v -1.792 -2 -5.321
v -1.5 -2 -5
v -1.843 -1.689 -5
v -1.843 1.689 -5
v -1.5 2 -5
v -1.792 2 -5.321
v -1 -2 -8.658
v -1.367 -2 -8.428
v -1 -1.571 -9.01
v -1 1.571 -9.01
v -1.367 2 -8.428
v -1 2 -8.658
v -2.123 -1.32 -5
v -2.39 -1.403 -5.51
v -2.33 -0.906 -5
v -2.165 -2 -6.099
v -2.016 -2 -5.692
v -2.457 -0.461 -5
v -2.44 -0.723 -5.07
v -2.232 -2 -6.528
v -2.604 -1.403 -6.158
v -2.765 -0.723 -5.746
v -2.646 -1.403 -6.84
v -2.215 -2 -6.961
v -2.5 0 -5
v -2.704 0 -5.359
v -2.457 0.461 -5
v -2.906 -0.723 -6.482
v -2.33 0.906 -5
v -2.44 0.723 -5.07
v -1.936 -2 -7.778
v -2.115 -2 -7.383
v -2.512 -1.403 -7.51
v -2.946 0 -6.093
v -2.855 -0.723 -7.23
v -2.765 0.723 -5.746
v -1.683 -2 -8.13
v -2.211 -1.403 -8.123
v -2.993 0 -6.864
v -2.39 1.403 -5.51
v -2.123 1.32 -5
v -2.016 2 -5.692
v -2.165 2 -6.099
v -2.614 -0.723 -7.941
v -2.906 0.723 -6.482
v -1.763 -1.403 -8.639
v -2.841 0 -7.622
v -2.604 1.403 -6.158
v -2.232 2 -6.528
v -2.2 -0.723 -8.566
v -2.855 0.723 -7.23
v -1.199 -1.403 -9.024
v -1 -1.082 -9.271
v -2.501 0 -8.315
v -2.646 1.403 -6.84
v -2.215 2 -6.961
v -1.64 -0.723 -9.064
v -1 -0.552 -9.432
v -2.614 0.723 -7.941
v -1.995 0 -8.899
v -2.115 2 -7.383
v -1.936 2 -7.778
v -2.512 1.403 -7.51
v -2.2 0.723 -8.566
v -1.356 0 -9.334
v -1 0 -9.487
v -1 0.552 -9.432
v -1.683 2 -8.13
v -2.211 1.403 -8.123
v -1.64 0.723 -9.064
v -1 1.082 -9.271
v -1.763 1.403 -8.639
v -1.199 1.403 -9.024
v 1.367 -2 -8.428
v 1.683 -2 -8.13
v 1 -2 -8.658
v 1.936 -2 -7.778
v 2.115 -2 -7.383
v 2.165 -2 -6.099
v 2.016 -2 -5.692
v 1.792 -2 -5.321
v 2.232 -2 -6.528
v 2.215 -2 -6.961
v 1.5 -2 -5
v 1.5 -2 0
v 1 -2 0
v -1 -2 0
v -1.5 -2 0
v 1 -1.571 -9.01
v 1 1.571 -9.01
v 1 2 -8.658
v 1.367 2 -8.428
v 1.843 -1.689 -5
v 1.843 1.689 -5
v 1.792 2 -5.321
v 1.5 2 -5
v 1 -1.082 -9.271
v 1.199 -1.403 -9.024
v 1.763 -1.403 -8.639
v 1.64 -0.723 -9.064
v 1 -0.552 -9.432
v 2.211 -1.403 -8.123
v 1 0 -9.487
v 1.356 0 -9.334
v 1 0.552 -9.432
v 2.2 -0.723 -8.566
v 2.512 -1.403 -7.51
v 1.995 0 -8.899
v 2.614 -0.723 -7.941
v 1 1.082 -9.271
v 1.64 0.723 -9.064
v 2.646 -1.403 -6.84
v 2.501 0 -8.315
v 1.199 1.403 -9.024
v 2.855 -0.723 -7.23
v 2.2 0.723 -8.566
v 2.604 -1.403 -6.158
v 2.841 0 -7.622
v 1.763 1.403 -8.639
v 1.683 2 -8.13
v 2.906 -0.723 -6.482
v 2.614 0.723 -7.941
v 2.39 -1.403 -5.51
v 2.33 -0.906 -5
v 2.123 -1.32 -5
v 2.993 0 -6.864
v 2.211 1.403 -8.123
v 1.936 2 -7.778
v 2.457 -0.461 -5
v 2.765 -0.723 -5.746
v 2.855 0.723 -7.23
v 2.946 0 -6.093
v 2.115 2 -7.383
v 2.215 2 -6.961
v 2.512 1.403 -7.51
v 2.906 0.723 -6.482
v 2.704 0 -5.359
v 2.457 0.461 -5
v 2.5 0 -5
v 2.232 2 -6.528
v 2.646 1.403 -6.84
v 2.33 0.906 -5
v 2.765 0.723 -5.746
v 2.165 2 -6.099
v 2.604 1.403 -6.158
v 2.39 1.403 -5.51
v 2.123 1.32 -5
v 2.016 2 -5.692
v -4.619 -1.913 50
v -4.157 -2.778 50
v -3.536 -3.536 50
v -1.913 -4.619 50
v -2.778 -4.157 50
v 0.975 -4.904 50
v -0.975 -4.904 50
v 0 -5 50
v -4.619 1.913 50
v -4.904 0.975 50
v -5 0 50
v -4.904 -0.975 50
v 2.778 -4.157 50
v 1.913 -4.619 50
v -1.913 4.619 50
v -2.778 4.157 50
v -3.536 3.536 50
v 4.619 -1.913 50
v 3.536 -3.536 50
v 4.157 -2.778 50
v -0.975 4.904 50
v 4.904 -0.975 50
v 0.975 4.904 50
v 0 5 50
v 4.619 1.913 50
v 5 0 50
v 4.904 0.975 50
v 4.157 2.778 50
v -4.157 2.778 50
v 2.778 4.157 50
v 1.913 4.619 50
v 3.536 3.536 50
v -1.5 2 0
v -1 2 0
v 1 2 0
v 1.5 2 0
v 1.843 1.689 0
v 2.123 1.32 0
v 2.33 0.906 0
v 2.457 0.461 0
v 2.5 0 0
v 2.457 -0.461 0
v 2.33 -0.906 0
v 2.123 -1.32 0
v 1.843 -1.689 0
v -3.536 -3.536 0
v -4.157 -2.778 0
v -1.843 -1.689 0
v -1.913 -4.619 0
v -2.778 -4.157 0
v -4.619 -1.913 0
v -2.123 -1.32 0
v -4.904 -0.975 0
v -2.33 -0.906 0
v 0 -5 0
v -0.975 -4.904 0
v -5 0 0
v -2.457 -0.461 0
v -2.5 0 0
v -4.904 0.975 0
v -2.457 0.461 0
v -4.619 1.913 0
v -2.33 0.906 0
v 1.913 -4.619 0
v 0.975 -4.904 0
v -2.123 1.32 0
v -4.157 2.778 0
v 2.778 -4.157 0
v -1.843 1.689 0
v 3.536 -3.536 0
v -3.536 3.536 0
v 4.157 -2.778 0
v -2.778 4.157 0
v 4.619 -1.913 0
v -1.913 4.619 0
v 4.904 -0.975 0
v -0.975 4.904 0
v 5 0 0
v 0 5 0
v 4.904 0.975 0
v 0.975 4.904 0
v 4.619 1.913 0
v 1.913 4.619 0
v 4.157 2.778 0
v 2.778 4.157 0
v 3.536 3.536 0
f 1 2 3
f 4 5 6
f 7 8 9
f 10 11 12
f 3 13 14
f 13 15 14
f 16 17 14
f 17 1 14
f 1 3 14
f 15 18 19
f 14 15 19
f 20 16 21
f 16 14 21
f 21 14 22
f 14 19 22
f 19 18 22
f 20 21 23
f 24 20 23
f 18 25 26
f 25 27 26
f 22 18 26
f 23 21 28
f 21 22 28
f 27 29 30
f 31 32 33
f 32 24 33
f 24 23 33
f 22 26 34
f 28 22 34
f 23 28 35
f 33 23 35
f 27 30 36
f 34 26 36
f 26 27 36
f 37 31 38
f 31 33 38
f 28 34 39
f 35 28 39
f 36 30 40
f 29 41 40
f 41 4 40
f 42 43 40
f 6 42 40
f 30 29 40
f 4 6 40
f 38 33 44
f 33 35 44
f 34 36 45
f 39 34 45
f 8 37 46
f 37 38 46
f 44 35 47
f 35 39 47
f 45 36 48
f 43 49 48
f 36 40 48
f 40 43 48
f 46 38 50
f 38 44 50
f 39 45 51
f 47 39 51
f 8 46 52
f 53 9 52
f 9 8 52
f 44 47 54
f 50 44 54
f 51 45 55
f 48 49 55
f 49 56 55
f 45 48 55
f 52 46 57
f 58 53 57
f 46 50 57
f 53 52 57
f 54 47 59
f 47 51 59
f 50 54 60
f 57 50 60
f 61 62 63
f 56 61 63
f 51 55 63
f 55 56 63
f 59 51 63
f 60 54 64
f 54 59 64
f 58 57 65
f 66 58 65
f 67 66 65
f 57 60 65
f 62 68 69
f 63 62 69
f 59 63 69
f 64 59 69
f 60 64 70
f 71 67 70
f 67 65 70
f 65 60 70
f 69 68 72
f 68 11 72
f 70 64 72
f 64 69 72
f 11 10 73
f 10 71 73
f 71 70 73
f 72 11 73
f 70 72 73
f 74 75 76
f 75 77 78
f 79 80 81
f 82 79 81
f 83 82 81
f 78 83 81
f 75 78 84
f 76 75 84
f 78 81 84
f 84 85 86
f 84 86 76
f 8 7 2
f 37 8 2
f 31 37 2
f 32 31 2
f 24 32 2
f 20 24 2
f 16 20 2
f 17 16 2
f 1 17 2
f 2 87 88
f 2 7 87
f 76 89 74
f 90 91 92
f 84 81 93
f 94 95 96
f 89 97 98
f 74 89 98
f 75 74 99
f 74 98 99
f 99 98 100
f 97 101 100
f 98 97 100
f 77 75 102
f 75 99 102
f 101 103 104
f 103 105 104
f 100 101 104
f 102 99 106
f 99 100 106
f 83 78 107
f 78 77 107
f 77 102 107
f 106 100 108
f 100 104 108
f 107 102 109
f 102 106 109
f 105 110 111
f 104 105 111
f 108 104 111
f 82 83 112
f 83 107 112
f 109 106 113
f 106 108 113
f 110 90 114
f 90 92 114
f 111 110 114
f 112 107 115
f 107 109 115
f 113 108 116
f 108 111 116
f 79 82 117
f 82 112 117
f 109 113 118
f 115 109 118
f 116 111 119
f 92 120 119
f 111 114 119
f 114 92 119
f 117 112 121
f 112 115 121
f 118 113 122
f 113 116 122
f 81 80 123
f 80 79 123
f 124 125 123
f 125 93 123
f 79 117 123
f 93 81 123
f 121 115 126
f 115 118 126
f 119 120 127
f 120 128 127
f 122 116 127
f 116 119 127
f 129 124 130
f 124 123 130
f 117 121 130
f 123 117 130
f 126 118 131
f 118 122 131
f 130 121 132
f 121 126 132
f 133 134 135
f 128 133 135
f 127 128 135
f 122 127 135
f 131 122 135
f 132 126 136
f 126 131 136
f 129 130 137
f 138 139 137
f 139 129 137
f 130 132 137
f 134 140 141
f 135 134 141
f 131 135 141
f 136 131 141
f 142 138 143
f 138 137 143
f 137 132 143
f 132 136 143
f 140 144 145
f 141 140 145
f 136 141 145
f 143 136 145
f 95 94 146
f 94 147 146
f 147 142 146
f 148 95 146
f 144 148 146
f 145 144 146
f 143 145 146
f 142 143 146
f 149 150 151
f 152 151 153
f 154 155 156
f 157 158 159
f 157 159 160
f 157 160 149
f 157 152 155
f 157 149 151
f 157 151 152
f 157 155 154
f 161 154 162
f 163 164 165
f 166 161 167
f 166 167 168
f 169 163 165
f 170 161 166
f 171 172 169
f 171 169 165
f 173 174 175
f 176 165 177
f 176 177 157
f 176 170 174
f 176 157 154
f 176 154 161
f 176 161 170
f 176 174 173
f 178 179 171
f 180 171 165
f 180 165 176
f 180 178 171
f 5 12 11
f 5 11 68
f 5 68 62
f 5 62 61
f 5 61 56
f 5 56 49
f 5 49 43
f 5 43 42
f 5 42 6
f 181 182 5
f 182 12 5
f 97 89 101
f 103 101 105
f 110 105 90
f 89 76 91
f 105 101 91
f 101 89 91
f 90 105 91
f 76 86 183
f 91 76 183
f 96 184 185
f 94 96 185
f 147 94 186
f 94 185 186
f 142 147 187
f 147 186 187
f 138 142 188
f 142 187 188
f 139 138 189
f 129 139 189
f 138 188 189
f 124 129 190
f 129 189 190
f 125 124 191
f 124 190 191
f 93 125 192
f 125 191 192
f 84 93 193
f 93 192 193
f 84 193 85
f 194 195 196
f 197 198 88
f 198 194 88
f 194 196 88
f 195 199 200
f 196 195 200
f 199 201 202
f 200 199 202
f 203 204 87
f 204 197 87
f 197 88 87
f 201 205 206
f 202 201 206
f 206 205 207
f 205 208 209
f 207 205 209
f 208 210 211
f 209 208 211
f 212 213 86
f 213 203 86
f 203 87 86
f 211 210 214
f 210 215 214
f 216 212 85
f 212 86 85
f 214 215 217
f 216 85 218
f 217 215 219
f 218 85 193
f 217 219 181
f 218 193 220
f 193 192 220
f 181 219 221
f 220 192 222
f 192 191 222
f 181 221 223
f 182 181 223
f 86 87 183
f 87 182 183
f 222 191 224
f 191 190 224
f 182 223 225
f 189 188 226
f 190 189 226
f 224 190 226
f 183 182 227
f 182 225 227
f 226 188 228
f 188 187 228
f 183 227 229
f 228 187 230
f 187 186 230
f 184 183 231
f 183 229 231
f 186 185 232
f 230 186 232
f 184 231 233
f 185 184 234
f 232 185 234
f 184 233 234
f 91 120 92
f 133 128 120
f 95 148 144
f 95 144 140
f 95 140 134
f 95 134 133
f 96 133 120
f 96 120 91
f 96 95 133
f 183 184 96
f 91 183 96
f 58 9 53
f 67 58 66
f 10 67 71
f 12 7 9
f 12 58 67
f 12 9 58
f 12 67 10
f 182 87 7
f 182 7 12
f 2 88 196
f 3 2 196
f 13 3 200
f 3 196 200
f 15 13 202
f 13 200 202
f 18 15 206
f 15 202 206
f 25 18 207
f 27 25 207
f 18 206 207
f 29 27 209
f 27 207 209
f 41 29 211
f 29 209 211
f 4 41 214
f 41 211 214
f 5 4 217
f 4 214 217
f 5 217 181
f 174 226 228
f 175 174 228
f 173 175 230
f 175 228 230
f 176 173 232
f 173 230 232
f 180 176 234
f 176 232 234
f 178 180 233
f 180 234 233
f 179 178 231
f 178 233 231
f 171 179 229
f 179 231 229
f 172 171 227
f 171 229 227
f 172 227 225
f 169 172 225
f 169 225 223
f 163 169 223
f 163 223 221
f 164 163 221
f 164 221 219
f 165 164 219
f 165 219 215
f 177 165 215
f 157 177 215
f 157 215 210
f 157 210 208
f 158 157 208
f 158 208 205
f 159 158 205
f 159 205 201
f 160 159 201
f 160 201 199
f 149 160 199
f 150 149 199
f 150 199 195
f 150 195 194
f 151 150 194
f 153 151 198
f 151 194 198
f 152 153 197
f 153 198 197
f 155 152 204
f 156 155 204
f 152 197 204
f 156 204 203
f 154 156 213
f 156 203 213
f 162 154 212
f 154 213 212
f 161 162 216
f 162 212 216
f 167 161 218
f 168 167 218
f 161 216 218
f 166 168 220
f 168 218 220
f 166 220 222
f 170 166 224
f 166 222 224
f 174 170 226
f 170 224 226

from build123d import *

# Parameters (mm, degrees)
SKETCH1_R           = 5
BOSS_EXTRUDE1_DEPTH = 50
SKETCH4_R           = 2.5
BOSS_EXTRUDE3_DEPTH = 5
SKETCH10_W          = 2
SKETCH10_H          = 10.578661844
CUT_EXTRUDE4_DEPTH  = 51.497524692
SKETCH11_W          = 10
SKETCH11_H          = 0.828427125
CUT_EXTRUDE5_DEPTH  = 51.497524692


with BuildPart() as part:
    # Sketch1 → Boss-Extrude1 (new body)
    with BuildSketch(Plane.XY):
        Circle(SKETCH1_R)
    extrude(amount=BOSS_EXTRUDE1_DEPTH)

    # Sketch4 → Boss-Extrude3 (add)
    with BuildSketch(Plane(origin=(0, 0, 0), x_dir=(-1, 0, 0), z_dir=(0, 0, -1))):
        Circle(SKETCH4_R)
    extrude(amount=BOSS_EXTRUDE3_DEPTH)

    # Sketch8 → Revolve1 (revolve)
    with BuildSketch(Plane(origin=(0, 0, 0), x_dir=(0, 0, -1), z_dir=(1, 0, 0))):
        with BuildLine():
            Line((6.658312395, 3), (6.658312395, -3))
            ThreePointArc((6.658312395, -3), (3.658312395, 0), (6.658312395, 3))
        make_face()
    revolve(axis=Axis((0, 3, -6.658312395), (0, -1, 0)))

    # Sketch10 → Cut-Extrude4 (cut, through all)
    with BuildSketch(Plane(origin=(0, 0, 0), x_dir=(-1, 0, 0), z_dir=(0, 0, -1))):
        Rectangle(SKETCH10_W, SKETCH10_H)
    extrude(amount=CUT_EXTRUDE4_DEPTH, mode=Mode.SUBTRACT)

    # Sketch11 → Cut-Extrude5 (cut, through all)
    with BuildSketch(Plane(origin=(0, 0, 0), x_dir=(-1, 0, 0), z_dir=(0, 0, -1))):
        with Locations((0, 2.414213563)):
            Rectangle(SKETCH11_W, SKETCH11_H)
        with Locations((0, -2.414213563)):
            Rectangle(SKETCH11_W, SKETCH11_H)
    extrude(amount=CUT_EXTRUDE5_DEPTH, mode=Mode.SUBTRACT)


solid = part.part
